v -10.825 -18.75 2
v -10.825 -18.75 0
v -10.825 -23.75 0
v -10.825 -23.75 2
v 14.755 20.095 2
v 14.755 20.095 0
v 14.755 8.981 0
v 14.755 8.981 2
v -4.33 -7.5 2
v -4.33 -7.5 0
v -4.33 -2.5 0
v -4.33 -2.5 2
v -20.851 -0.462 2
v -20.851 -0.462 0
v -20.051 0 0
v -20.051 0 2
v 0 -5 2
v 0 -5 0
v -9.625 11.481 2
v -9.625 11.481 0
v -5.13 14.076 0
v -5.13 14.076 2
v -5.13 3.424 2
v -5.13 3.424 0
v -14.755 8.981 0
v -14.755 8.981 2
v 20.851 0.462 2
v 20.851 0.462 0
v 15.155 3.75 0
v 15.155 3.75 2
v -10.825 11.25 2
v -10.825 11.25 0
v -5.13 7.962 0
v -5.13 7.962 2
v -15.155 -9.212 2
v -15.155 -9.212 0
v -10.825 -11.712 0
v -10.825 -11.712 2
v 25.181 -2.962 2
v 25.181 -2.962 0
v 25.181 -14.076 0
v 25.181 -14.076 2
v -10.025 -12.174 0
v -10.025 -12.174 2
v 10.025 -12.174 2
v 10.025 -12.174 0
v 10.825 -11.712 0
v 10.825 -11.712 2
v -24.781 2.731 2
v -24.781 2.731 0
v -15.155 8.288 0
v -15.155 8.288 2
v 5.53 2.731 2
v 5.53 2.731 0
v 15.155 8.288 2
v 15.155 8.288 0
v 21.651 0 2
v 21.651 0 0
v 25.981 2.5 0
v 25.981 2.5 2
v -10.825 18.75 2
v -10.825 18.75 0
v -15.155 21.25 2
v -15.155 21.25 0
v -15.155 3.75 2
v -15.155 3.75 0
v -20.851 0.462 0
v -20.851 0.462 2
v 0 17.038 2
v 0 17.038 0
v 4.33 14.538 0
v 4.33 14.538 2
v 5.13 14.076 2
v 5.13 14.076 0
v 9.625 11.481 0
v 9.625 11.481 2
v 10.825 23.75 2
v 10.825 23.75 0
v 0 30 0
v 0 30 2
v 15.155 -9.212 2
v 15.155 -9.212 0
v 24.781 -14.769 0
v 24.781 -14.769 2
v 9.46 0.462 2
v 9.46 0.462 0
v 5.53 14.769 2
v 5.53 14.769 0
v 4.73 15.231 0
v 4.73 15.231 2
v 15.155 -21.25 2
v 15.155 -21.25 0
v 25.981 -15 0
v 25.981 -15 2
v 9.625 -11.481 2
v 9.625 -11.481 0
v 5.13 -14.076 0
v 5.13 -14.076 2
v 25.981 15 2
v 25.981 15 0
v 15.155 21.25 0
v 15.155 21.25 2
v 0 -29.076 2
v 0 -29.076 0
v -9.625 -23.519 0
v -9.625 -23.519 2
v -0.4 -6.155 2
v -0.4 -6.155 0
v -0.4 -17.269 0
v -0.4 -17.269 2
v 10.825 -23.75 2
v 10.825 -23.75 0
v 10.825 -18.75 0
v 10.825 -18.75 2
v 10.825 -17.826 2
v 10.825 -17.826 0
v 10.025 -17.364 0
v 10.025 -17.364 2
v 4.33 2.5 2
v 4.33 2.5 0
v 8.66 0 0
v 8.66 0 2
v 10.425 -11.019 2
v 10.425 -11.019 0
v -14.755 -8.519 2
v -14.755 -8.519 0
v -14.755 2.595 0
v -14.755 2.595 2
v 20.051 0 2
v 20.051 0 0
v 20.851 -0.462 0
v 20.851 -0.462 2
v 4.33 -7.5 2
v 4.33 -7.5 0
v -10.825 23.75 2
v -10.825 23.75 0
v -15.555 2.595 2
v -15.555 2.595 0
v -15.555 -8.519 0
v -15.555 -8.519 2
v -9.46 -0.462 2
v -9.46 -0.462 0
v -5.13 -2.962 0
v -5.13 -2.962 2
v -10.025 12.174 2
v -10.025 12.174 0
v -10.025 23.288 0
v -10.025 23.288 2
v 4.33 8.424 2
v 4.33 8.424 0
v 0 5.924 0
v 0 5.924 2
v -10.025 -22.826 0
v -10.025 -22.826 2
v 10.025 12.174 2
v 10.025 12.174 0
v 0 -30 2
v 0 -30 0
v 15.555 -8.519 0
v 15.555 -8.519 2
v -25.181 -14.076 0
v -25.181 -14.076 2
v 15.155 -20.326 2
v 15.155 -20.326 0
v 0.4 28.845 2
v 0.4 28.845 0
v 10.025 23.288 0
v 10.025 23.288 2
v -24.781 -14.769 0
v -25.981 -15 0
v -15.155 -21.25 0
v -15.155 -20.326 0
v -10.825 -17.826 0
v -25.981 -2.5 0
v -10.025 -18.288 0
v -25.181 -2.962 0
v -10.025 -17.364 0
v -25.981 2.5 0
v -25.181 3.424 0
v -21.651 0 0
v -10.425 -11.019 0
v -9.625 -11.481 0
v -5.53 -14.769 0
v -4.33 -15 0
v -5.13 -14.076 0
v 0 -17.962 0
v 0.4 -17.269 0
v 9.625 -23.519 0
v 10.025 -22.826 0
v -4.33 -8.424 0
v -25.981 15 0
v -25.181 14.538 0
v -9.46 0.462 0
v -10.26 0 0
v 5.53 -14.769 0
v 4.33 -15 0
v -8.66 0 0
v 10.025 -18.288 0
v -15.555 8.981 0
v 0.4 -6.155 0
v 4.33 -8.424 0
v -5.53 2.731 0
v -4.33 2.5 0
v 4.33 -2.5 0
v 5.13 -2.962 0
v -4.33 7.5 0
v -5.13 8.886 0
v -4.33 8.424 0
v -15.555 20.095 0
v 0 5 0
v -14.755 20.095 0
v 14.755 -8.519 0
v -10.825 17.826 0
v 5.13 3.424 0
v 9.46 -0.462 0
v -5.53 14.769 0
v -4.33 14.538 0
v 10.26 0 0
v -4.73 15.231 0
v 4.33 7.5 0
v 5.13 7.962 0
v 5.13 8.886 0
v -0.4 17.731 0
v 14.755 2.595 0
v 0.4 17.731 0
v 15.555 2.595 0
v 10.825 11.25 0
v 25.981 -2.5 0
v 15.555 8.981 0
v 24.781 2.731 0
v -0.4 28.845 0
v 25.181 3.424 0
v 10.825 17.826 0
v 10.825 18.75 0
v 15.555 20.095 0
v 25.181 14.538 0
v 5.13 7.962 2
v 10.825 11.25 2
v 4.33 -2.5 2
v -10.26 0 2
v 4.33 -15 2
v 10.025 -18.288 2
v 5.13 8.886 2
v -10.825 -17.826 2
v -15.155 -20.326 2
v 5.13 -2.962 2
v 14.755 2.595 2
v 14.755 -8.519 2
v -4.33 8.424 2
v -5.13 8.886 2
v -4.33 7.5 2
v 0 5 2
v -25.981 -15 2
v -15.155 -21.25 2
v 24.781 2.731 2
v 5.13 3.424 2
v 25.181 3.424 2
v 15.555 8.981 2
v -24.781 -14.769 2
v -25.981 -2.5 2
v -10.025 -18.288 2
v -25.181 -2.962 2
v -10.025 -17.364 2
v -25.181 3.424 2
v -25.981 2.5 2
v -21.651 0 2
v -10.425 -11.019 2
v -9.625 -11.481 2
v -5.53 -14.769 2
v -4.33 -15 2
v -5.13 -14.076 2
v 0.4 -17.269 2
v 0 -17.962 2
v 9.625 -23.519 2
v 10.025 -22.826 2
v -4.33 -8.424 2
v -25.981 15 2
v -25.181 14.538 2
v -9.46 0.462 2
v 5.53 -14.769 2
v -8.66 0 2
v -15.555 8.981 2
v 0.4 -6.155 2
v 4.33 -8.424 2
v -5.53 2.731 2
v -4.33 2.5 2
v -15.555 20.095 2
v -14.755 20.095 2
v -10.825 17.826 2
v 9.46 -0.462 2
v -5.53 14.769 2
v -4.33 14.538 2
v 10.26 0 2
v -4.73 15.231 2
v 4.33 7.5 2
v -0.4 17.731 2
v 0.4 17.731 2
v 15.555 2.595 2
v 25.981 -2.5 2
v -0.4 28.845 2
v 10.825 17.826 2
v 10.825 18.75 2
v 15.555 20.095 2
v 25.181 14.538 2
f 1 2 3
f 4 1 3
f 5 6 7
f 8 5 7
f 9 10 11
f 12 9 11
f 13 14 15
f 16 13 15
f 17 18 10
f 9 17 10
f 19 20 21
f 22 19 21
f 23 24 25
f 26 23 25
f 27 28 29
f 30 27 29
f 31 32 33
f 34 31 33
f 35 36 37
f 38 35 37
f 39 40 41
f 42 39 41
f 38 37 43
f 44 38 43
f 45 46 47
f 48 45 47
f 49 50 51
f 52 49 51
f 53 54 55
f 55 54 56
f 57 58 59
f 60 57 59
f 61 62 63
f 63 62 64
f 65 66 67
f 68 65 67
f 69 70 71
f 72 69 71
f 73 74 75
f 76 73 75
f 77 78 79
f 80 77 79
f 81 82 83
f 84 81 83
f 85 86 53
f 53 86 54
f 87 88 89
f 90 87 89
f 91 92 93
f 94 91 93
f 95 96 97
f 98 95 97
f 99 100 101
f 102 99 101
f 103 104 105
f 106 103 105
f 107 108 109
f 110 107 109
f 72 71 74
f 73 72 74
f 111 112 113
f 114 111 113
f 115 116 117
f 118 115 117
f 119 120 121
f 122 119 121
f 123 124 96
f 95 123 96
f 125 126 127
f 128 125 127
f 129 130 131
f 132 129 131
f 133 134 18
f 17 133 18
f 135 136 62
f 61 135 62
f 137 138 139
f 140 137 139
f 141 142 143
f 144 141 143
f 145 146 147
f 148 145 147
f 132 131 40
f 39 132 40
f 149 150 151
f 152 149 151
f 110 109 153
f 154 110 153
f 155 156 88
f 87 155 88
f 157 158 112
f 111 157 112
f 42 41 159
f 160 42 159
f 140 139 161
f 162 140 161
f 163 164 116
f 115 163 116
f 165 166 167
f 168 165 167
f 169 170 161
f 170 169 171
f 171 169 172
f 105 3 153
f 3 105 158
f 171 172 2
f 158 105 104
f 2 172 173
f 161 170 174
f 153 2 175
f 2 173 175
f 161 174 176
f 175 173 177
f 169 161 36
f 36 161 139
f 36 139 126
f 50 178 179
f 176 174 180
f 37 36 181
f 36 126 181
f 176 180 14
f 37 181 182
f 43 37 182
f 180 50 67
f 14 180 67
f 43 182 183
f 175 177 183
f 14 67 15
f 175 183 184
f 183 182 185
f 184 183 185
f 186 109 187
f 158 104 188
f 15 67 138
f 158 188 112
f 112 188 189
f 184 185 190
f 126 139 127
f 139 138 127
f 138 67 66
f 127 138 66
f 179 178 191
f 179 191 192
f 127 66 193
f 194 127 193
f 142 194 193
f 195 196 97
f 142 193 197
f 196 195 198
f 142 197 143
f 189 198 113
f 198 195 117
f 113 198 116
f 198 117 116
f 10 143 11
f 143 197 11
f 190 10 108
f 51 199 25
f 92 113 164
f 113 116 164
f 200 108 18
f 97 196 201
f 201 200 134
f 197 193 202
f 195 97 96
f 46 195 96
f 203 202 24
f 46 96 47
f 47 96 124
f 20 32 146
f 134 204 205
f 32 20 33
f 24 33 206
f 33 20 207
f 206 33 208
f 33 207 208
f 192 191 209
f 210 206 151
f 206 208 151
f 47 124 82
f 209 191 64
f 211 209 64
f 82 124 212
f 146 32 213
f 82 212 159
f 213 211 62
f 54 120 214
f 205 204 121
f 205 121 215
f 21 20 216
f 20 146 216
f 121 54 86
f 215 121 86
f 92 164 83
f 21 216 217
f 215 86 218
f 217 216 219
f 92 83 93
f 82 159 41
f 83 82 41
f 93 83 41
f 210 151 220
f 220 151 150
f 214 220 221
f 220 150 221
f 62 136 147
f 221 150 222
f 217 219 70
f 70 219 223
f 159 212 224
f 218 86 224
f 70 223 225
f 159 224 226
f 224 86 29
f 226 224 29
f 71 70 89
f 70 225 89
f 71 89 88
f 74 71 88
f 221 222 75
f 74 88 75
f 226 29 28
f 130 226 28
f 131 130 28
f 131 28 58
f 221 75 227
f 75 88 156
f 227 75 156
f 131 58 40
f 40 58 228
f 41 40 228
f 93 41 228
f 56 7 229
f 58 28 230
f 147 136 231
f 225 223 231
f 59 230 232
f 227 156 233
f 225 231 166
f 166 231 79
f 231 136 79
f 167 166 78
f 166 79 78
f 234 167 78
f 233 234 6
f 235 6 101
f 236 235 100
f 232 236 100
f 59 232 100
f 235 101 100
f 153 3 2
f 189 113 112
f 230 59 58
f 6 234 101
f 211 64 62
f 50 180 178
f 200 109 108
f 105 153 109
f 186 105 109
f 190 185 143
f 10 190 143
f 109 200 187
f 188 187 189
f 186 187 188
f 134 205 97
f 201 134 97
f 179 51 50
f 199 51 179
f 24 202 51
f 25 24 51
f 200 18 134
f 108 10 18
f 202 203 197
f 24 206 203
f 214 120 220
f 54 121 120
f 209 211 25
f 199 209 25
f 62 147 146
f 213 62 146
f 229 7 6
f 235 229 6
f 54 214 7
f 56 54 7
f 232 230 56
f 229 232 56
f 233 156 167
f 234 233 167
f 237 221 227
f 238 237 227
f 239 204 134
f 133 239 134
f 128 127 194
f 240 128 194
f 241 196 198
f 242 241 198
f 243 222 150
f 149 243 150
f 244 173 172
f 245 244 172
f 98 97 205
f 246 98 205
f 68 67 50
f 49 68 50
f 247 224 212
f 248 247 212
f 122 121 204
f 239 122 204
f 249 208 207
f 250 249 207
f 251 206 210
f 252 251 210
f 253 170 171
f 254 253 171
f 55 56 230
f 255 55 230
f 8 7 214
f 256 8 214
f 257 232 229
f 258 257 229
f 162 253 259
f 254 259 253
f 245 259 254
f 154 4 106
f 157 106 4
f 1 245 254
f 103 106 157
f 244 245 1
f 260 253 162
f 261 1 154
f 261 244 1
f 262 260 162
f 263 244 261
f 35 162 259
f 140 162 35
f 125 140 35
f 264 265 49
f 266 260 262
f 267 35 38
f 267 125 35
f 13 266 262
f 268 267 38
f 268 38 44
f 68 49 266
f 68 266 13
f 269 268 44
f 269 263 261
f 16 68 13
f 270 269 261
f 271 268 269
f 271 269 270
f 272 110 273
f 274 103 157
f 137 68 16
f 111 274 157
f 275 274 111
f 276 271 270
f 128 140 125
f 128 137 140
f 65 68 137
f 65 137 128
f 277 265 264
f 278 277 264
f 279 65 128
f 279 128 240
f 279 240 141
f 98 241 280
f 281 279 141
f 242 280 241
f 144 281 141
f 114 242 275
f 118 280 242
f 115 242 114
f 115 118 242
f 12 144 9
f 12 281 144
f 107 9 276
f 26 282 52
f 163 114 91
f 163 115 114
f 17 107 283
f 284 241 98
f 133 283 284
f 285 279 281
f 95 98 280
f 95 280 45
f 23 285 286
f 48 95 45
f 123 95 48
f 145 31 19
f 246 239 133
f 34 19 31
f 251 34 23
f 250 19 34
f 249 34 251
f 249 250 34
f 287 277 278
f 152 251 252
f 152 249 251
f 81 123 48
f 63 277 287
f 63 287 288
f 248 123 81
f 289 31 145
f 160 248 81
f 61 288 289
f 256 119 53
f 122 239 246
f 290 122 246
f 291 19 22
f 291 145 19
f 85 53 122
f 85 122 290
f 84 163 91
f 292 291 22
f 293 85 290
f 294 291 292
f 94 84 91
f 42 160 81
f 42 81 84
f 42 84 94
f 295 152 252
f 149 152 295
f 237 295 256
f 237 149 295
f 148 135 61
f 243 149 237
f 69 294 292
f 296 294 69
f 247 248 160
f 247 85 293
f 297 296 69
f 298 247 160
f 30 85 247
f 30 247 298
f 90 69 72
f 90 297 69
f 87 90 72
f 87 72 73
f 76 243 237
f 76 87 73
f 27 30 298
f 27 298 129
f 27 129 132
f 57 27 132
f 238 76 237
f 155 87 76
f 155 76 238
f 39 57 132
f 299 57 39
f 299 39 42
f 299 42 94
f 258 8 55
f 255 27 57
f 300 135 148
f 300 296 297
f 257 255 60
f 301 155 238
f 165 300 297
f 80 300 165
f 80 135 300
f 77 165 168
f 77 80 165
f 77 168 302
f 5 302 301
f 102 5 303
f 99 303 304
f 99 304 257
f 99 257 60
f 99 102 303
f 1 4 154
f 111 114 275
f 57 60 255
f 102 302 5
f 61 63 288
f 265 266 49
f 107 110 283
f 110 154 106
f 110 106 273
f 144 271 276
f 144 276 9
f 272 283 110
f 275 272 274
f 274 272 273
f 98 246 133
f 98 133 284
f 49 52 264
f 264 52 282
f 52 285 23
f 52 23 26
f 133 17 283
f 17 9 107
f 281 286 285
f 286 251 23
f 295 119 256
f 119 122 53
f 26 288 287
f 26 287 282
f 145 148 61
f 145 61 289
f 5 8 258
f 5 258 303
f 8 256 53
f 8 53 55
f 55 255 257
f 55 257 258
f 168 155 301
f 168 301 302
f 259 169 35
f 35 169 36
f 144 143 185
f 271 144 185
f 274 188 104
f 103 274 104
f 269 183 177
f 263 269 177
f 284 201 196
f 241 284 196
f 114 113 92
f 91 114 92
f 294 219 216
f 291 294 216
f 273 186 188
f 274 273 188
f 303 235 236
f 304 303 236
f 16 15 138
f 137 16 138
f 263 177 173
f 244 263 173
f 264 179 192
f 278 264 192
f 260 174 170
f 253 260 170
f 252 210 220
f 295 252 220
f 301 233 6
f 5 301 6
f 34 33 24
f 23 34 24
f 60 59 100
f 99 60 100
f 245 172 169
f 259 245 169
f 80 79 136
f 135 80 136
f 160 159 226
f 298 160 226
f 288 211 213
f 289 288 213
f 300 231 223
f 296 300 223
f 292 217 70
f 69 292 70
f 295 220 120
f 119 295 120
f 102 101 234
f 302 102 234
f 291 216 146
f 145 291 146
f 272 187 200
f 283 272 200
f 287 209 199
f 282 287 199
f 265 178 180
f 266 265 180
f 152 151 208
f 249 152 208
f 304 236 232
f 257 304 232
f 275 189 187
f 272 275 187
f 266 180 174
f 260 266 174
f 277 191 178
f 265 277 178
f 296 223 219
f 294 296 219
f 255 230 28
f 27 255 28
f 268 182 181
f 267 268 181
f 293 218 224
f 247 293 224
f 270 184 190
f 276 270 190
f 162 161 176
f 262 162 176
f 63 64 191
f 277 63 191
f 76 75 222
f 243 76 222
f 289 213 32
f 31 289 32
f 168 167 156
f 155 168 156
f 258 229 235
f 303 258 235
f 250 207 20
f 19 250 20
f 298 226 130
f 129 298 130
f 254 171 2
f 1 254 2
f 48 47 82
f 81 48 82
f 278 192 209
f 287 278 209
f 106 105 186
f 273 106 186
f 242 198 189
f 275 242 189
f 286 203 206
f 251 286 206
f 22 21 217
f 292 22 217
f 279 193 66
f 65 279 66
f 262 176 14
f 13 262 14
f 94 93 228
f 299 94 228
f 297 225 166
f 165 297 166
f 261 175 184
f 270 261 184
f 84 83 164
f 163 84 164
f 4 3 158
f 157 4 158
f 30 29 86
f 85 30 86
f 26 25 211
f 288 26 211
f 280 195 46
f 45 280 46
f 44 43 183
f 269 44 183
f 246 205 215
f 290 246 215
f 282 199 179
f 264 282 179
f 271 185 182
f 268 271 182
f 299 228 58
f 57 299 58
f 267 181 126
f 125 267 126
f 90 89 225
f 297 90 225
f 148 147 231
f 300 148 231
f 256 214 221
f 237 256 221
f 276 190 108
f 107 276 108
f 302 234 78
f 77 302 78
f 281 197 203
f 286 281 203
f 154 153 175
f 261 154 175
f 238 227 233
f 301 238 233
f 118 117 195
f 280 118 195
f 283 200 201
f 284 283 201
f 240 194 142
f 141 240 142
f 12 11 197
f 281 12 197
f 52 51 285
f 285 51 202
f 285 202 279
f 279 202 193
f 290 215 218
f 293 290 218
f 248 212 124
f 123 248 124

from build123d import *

# Parameters (mm, degrees)
F1_DEPTH = 2


# Not quite as in the source:
# - a feature names something its author has since deleted; it is built from what else it names


with BuildPart() as f1:
    # F0 (on Top) → F1 (new body)
    with BuildSketch(Plane.XY):
        Polygon((-15.1554445662, 3.75), (-20.8506350946, 0.4618802154), (-20.0506350946, 0), (-15.5554445662, 2.5952994616), (-15.5554445662, -2.5952994616), (-15.1554445662, -2.8262395693), (-14.7554445662, -2.5952994616), (-14.7554445662, 2.5952994616), (-10.2602540378, 0), (-9.4602540378, 0.4618802154), align=None)
        Polygon((-15.1554445662, -21.25), (-10.8253175473, -18.75), (-10.8253175473, -17.8262395693), (-15.1554445662, -20.3262395693), (-24.7807621135, -14.7690598923), (-15.1554445662, -9.2118802154), (-10.8253175473, -11.7118802154), (-10.8253175473, -11.25), (-10.4253175473, -11.0190598923), (-14.7554445662, -8.5190598923), (-14.7554445662, -3.5190598923), (-15.1554445662, -3.75), (-15.5554445662, -3.5190598923), (-15.5554445662, -8.5190598923), (-25.1807621135, -14.0762395693), (-25.1807621135, -2.9618802154), (-20.8506350946, -0.4618802154), (-21.6506350946, 0), (-25.9807621135, -2.5), (-25.9807621135, -15), align=None)
        Polygon((-10.0253175473, -17.3643593539), (-10.0253175473, -18.2881197846), (-4.3301270189, -15), (-4.3301270189, -8.4237604307), (-5.1301270189, -8.8856406461), (-5.1301270189, -14.0762395693), (-9.6253175473, -11.4809401077), (-10.0253175473, -11.7118802154), (-10.0253175473, -12.1737604307), (-5.5301270189, -14.7690598923), align=None)
        Polygon((-5.1301270189, -7.9618802154), (-4.3301270189, -7.5), (-4.3301270189, -2.5), (-8.6602540378, 0), (-9.4602540378, -0.4618802154), (-5.1301270189, -2.9618802154), align=None)
        Polygon((-15.1554445662, -3.75), (-14.7554445662, -3.5190598923), (-14.7554445662, -2.5952994616), (-15.1554445662, -2.8262395693), (-15.5554445662, -2.5952994616), (-15.5554445662, -3.5190598923), align=None)
        Polygon((-20.8506350946, 0.4618802154), (-21.6506350946, 0), (-20.8506350946, -0.4618802154), (-20.0506350946, 0), align=None)
        Polygon((-9.4602540378, -0.4618802154), (-8.6602540378, 0), (-9.4602540378, 0.4618802154), (-10.2602540378, 0), align=None)
        Polygon((-25.9807621135, 2.5), (-21.6506350946, 0), (-20.8506350946, 0.4618802154), (-24.7807621135, 2.7309401077), (-15.1554445662, 8.2881197846), (-5.5301270189, 2.7309401077), (-9.4602540378, 0.4618802154), (-8.6602540378, 0), (-4.3301270189, 2.5), (-4.3301270189, 7.5), (-5.1301270189, 7.9618802154), (-5.1301270189, 3.4237604307), (-14.7554445662, 8.9809401077), (-14.7554445662, 20.0952994616), (-10.8253175473, 17.8262395693), (-10.8253175473, 18.75), (-15.1554445662, 21.25), (-25.9807621135, 15), align=None)
        Polygon((-15.5554445662, 8.9809401077), (-25.1807621135, 3.4237604307), (-25.1807621135, 14.5381197846), (-15.5554445662, 20.0952994616), align=None, mode=Mode.SUBTRACT)
        Polygon((-5.1301270189, -8.8856406461), (-4.3301270189, -8.4237604307), (-4.3301270189, -7.5), (-5.1301270189, -7.9618802154), align=None)
        Polygon((-10.8253175473, -11.25), (-10.8253175473, -11.7118802154), (-10.0253175473, -12.1737604307), (-10.0253175473, -11.7118802154), (-9.6253175473, -11.4809401077), (-10.4253175473, -11.0190598923), align=None)
        Polygon((-10.8253175473, -23.75), (0, -30), (10.8253175473, -23.75), (10.8253175473, -18.75), (10.0253175473, -18.2881197846), (10.0253175473, -22.8262395693), (0.4, -17.2690598923), (0.4, -6.1547005384), (4.3301270189, -8.4237604307), (4.3301270189, -7.5), (0, -5), (-4.3301270189, -7.5), (-4.3301270189, -8.4237604307), (-0.4, -6.1547005384), (-0.4, -17.2690598923), (-10.0253175473, -22.8262395693), (-10.0253175473, -18.2881197846), (-10.8253175473, -18.75), align=None)
        Polygon((0, -17.9618802154), (9.6253175473, -23.5190598923), (0, -29.0762395693), (-9.6253175473, -23.5190598923), align=None, mode=Mode.SUBTRACT)
        Polygon((-10.8253175473, -17.8262395693), (-10.8253175473, -18.75), (-10.0253175473, -18.2881197846), (-10.0253175473, -17.3643593539), align=None)
        Polygon((-10.8253175473, 11.25), (-5.1301270189, 7.9618802154), (-5.1301270189, 8.8856406461), (-9.6253175473, 11.4809401077), (-5.1301270189, 14.0762395693), (-5.1301270189, 14.5381197846), (-5.5301270189, 14.7690598923), (-10.0253175473, 12.1737604307), (-10.0253175473, 17.3643593539), (-10.8253175473, 17.8262395693), align=None)
        Polygon((-5.1301270189, 7.9618802154), (-4.3301270189, 7.5), (-4.3301270189, 8.4237604307), (-5.1301270189, 8.8856406461), align=None)
        Polygon((-10.0253175473, 18.2881197846), (-10.8253175473, 18.75), (-10.8253175473, 17.8262395693), (-10.0253175473, 17.3643593539), align=None)
        Polygon((-5.1301270189, 14.0762395693), (-4.3301270189, 14.5381197846), (-4.3301270189, 15), (-4.7301270189, 15.2309401077), (-5.5301270189, 14.7690598923), (-5.1301270189, 14.5381197846), align=None)
        Polygon((-10.8253175473, 23.75), (-10.8253175473, 18.75), (-10.0253175473, 18.2881197846), (-10.0253175473, 23.2881197846), (-0.4, 28.8452994616), (-0.4, 17.7309401077), (-4.7301270189, 15.2309401077), (-4.3301270189, 15), (-4.3301270189, 14.5381197846), (0, 17.0381197846), (4.3301270189, 14.5381197846), (4.3301270189, 15), (4.7301270189, 15.2309401077), (0.4, 17.7309401077), (0.4, 28.8452994616), (10.0253175473, 23.2881197846), (10.0253175473, 18.2881197846), (10.8253175473, 18.75), (10.8253175473, 23.75), (0, 30), align=None)
        Polygon((-4.3301270189, 8.4237604307), (-4.3301270189, 7.5), (0, 5), (4.3301270189, 7.5), (4.3301270189, 8.4237604307), (0, 5.9237604307), align=None)
        Polygon((4.3301270189, 8.4237604307), (4.3301270189, 7.5), (5.1301270189, 7.9618802154), (5.1301270189, 8.8856406461), align=None)
        Polygon((10.8253175473, 11.25), (10.8253175473, 17.8262395693), (10.0253175473, 17.3643593539), (10.0253175473, 12.1737604307), (5.5301270189, 14.7690598923), (5.1301270189, 14.5381197846), (5.1301270189, 14.0762395693), (9.6253175473, 11.4809401077), (5.1301270189, 8.8856406461), (5.1301270189, 7.9618802154), align=None)
        Polygon((5.5301270189, 14.7690598923), (4.7301270189, 15.2309401077), (4.3301270189, 15), (4.3301270189, 14.5381197846), (5.1301270189, 14.0762395693), (5.1301270189, 14.5381197846), align=None)
        Polygon((20.8506350946, 0.4618802154), (21.6506350946, 0), (25.9807621135, 2.5), (25.9807621135, 15), (15.1554445662, 21.25), (10.8253175473, 18.75), (10.8253175473, 17.8262395693), (14.7554445662, 20.0952994616), (14.7554445662, 8.9809401077), (5.1301270189, 3.4237604307), (5.1301270189, 7.9618802154), (4.3301270189, 7.5), (4.3301270189, 2.5), (8.6602540378, 0), (9.4602540378, 0.4618802154), (5.5301270189, 2.7309401077), (15.1554445662, 8.2881197846), (24.7807621135, 2.7309401077), align=None)
        Polygon((15.5554445662, 8.9809401077), (15.5554445662, 20.0952994616), (25.1807621135, 14.5381197846), (25.1807621135, 3.4237604307), align=None, mode=Mode.SUBTRACT)
        Polygon((10.8253175473, 17.8262395693), (10.8253175473, 18.75), (10.0253175473, 18.2881197846), (10.0253175473, 17.3643593539), align=None)
        Polygon((9.4602540378, 0.4618802154), (8.6602540378, 0), (9.4602540378, -0.4618802154), (10.2602540378, 0), align=None)
        Polygon((20.0506350946, 0), (20.8506350946, 0.4618802154), (15.1554445662, 3.75), (9.4602540378, 0.4618802154), (10.2602540378, 0), (14.7554445662, 2.5952994616), (14.7554445662, -2.5952994616), (15.1554445662, -2.8262395693), (15.5554445662, -2.5952994616), (15.5554445662, 2.5952994616), align=None)
        Polygon((14.7554445662, -2.5952994616), (14.7554445662, -3.5190598923), (15.1554445662, -3.75), (15.5554445662, -3.5190598923), (15.5554445662, -2.5952994616), (15.1554445662, -2.8262395693), align=None)
        Polygon((20.8506350946, -0.4618802154), (21.6506350946, 0), (20.8506350946, 0.4618802154), (20.0506350946, 0), align=None)
        Polygon((10.8253175473, -17.8262395693), (10.8253175473, -18.75), (15.1554445662, -21.25), (25.9807621135, -15), (25.9807621135, -2.5), (21.6506350946, 0), (20.8506350946, -0.4618802154), (25.1807621135, -2.9618802154), (25.1807621135, -14.0762395693), (15.5554445662, -8.5190598923), (15.5554445662, -3.5190598923), (15.1554445662, -3.75), (14.7554445662, -3.5190598923), (14.7554445662, -8.5190598923), (10.4253175473, -11.0190598923), (10.8253175473, -11.25), (10.8253175473, -11.7118802154), (15.1554445662, -9.2118802154), (24.7807621135, -14.7690598923), (15.1554445662, -20.3262395693), align=None)
        Polygon((4.3301270189, -2.5), (4.3301270189, -7.5), (5.1301270189, -7.9618802154), (5.1301270189, -2.9618802154), (9.4602540378, -0.4618802154), (8.6602540378, 0), align=None)
        Polygon((4.3301270189, -7.5), (4.3301270189, -8.4237604307), (5.1301270189, -8.8856406461), (5.1301270189, -7.9618802154), align=None)
        Polygon((4.3301270189, -15), (10.0253175473, -18.2881197846), (10.0253175473, -17.3643593539), (5.5301270189, -14.7690598923), (10.0253175473, -12.1737604307), (10.0253175473, -11.7118802154), (9.6253175473, -11.4809401077), (5.1301270189, -14.0762395693), (5.1301270189, -8.8856406461), (4.3301270189, -8.4237604307), align=None)
        Polygon((10.0253175473, -18.2881197846), (10.8253175473, -18.75), (10.8253175473, -17.8262395693), (10.0253175473, -17.3643593539), align=None)
        Polygon((10.0253175473, -12.1737604307), (10.8253175473, -11.7118802154), (10.8253175473, -11.25), (10.4253175473, -11.0190598923), (9.6253175473, -11.4809401077), (10.0253175473, -11.7118802154), align=None)
    extrude(amount=F1_DEPTH)


solid = f1.part
